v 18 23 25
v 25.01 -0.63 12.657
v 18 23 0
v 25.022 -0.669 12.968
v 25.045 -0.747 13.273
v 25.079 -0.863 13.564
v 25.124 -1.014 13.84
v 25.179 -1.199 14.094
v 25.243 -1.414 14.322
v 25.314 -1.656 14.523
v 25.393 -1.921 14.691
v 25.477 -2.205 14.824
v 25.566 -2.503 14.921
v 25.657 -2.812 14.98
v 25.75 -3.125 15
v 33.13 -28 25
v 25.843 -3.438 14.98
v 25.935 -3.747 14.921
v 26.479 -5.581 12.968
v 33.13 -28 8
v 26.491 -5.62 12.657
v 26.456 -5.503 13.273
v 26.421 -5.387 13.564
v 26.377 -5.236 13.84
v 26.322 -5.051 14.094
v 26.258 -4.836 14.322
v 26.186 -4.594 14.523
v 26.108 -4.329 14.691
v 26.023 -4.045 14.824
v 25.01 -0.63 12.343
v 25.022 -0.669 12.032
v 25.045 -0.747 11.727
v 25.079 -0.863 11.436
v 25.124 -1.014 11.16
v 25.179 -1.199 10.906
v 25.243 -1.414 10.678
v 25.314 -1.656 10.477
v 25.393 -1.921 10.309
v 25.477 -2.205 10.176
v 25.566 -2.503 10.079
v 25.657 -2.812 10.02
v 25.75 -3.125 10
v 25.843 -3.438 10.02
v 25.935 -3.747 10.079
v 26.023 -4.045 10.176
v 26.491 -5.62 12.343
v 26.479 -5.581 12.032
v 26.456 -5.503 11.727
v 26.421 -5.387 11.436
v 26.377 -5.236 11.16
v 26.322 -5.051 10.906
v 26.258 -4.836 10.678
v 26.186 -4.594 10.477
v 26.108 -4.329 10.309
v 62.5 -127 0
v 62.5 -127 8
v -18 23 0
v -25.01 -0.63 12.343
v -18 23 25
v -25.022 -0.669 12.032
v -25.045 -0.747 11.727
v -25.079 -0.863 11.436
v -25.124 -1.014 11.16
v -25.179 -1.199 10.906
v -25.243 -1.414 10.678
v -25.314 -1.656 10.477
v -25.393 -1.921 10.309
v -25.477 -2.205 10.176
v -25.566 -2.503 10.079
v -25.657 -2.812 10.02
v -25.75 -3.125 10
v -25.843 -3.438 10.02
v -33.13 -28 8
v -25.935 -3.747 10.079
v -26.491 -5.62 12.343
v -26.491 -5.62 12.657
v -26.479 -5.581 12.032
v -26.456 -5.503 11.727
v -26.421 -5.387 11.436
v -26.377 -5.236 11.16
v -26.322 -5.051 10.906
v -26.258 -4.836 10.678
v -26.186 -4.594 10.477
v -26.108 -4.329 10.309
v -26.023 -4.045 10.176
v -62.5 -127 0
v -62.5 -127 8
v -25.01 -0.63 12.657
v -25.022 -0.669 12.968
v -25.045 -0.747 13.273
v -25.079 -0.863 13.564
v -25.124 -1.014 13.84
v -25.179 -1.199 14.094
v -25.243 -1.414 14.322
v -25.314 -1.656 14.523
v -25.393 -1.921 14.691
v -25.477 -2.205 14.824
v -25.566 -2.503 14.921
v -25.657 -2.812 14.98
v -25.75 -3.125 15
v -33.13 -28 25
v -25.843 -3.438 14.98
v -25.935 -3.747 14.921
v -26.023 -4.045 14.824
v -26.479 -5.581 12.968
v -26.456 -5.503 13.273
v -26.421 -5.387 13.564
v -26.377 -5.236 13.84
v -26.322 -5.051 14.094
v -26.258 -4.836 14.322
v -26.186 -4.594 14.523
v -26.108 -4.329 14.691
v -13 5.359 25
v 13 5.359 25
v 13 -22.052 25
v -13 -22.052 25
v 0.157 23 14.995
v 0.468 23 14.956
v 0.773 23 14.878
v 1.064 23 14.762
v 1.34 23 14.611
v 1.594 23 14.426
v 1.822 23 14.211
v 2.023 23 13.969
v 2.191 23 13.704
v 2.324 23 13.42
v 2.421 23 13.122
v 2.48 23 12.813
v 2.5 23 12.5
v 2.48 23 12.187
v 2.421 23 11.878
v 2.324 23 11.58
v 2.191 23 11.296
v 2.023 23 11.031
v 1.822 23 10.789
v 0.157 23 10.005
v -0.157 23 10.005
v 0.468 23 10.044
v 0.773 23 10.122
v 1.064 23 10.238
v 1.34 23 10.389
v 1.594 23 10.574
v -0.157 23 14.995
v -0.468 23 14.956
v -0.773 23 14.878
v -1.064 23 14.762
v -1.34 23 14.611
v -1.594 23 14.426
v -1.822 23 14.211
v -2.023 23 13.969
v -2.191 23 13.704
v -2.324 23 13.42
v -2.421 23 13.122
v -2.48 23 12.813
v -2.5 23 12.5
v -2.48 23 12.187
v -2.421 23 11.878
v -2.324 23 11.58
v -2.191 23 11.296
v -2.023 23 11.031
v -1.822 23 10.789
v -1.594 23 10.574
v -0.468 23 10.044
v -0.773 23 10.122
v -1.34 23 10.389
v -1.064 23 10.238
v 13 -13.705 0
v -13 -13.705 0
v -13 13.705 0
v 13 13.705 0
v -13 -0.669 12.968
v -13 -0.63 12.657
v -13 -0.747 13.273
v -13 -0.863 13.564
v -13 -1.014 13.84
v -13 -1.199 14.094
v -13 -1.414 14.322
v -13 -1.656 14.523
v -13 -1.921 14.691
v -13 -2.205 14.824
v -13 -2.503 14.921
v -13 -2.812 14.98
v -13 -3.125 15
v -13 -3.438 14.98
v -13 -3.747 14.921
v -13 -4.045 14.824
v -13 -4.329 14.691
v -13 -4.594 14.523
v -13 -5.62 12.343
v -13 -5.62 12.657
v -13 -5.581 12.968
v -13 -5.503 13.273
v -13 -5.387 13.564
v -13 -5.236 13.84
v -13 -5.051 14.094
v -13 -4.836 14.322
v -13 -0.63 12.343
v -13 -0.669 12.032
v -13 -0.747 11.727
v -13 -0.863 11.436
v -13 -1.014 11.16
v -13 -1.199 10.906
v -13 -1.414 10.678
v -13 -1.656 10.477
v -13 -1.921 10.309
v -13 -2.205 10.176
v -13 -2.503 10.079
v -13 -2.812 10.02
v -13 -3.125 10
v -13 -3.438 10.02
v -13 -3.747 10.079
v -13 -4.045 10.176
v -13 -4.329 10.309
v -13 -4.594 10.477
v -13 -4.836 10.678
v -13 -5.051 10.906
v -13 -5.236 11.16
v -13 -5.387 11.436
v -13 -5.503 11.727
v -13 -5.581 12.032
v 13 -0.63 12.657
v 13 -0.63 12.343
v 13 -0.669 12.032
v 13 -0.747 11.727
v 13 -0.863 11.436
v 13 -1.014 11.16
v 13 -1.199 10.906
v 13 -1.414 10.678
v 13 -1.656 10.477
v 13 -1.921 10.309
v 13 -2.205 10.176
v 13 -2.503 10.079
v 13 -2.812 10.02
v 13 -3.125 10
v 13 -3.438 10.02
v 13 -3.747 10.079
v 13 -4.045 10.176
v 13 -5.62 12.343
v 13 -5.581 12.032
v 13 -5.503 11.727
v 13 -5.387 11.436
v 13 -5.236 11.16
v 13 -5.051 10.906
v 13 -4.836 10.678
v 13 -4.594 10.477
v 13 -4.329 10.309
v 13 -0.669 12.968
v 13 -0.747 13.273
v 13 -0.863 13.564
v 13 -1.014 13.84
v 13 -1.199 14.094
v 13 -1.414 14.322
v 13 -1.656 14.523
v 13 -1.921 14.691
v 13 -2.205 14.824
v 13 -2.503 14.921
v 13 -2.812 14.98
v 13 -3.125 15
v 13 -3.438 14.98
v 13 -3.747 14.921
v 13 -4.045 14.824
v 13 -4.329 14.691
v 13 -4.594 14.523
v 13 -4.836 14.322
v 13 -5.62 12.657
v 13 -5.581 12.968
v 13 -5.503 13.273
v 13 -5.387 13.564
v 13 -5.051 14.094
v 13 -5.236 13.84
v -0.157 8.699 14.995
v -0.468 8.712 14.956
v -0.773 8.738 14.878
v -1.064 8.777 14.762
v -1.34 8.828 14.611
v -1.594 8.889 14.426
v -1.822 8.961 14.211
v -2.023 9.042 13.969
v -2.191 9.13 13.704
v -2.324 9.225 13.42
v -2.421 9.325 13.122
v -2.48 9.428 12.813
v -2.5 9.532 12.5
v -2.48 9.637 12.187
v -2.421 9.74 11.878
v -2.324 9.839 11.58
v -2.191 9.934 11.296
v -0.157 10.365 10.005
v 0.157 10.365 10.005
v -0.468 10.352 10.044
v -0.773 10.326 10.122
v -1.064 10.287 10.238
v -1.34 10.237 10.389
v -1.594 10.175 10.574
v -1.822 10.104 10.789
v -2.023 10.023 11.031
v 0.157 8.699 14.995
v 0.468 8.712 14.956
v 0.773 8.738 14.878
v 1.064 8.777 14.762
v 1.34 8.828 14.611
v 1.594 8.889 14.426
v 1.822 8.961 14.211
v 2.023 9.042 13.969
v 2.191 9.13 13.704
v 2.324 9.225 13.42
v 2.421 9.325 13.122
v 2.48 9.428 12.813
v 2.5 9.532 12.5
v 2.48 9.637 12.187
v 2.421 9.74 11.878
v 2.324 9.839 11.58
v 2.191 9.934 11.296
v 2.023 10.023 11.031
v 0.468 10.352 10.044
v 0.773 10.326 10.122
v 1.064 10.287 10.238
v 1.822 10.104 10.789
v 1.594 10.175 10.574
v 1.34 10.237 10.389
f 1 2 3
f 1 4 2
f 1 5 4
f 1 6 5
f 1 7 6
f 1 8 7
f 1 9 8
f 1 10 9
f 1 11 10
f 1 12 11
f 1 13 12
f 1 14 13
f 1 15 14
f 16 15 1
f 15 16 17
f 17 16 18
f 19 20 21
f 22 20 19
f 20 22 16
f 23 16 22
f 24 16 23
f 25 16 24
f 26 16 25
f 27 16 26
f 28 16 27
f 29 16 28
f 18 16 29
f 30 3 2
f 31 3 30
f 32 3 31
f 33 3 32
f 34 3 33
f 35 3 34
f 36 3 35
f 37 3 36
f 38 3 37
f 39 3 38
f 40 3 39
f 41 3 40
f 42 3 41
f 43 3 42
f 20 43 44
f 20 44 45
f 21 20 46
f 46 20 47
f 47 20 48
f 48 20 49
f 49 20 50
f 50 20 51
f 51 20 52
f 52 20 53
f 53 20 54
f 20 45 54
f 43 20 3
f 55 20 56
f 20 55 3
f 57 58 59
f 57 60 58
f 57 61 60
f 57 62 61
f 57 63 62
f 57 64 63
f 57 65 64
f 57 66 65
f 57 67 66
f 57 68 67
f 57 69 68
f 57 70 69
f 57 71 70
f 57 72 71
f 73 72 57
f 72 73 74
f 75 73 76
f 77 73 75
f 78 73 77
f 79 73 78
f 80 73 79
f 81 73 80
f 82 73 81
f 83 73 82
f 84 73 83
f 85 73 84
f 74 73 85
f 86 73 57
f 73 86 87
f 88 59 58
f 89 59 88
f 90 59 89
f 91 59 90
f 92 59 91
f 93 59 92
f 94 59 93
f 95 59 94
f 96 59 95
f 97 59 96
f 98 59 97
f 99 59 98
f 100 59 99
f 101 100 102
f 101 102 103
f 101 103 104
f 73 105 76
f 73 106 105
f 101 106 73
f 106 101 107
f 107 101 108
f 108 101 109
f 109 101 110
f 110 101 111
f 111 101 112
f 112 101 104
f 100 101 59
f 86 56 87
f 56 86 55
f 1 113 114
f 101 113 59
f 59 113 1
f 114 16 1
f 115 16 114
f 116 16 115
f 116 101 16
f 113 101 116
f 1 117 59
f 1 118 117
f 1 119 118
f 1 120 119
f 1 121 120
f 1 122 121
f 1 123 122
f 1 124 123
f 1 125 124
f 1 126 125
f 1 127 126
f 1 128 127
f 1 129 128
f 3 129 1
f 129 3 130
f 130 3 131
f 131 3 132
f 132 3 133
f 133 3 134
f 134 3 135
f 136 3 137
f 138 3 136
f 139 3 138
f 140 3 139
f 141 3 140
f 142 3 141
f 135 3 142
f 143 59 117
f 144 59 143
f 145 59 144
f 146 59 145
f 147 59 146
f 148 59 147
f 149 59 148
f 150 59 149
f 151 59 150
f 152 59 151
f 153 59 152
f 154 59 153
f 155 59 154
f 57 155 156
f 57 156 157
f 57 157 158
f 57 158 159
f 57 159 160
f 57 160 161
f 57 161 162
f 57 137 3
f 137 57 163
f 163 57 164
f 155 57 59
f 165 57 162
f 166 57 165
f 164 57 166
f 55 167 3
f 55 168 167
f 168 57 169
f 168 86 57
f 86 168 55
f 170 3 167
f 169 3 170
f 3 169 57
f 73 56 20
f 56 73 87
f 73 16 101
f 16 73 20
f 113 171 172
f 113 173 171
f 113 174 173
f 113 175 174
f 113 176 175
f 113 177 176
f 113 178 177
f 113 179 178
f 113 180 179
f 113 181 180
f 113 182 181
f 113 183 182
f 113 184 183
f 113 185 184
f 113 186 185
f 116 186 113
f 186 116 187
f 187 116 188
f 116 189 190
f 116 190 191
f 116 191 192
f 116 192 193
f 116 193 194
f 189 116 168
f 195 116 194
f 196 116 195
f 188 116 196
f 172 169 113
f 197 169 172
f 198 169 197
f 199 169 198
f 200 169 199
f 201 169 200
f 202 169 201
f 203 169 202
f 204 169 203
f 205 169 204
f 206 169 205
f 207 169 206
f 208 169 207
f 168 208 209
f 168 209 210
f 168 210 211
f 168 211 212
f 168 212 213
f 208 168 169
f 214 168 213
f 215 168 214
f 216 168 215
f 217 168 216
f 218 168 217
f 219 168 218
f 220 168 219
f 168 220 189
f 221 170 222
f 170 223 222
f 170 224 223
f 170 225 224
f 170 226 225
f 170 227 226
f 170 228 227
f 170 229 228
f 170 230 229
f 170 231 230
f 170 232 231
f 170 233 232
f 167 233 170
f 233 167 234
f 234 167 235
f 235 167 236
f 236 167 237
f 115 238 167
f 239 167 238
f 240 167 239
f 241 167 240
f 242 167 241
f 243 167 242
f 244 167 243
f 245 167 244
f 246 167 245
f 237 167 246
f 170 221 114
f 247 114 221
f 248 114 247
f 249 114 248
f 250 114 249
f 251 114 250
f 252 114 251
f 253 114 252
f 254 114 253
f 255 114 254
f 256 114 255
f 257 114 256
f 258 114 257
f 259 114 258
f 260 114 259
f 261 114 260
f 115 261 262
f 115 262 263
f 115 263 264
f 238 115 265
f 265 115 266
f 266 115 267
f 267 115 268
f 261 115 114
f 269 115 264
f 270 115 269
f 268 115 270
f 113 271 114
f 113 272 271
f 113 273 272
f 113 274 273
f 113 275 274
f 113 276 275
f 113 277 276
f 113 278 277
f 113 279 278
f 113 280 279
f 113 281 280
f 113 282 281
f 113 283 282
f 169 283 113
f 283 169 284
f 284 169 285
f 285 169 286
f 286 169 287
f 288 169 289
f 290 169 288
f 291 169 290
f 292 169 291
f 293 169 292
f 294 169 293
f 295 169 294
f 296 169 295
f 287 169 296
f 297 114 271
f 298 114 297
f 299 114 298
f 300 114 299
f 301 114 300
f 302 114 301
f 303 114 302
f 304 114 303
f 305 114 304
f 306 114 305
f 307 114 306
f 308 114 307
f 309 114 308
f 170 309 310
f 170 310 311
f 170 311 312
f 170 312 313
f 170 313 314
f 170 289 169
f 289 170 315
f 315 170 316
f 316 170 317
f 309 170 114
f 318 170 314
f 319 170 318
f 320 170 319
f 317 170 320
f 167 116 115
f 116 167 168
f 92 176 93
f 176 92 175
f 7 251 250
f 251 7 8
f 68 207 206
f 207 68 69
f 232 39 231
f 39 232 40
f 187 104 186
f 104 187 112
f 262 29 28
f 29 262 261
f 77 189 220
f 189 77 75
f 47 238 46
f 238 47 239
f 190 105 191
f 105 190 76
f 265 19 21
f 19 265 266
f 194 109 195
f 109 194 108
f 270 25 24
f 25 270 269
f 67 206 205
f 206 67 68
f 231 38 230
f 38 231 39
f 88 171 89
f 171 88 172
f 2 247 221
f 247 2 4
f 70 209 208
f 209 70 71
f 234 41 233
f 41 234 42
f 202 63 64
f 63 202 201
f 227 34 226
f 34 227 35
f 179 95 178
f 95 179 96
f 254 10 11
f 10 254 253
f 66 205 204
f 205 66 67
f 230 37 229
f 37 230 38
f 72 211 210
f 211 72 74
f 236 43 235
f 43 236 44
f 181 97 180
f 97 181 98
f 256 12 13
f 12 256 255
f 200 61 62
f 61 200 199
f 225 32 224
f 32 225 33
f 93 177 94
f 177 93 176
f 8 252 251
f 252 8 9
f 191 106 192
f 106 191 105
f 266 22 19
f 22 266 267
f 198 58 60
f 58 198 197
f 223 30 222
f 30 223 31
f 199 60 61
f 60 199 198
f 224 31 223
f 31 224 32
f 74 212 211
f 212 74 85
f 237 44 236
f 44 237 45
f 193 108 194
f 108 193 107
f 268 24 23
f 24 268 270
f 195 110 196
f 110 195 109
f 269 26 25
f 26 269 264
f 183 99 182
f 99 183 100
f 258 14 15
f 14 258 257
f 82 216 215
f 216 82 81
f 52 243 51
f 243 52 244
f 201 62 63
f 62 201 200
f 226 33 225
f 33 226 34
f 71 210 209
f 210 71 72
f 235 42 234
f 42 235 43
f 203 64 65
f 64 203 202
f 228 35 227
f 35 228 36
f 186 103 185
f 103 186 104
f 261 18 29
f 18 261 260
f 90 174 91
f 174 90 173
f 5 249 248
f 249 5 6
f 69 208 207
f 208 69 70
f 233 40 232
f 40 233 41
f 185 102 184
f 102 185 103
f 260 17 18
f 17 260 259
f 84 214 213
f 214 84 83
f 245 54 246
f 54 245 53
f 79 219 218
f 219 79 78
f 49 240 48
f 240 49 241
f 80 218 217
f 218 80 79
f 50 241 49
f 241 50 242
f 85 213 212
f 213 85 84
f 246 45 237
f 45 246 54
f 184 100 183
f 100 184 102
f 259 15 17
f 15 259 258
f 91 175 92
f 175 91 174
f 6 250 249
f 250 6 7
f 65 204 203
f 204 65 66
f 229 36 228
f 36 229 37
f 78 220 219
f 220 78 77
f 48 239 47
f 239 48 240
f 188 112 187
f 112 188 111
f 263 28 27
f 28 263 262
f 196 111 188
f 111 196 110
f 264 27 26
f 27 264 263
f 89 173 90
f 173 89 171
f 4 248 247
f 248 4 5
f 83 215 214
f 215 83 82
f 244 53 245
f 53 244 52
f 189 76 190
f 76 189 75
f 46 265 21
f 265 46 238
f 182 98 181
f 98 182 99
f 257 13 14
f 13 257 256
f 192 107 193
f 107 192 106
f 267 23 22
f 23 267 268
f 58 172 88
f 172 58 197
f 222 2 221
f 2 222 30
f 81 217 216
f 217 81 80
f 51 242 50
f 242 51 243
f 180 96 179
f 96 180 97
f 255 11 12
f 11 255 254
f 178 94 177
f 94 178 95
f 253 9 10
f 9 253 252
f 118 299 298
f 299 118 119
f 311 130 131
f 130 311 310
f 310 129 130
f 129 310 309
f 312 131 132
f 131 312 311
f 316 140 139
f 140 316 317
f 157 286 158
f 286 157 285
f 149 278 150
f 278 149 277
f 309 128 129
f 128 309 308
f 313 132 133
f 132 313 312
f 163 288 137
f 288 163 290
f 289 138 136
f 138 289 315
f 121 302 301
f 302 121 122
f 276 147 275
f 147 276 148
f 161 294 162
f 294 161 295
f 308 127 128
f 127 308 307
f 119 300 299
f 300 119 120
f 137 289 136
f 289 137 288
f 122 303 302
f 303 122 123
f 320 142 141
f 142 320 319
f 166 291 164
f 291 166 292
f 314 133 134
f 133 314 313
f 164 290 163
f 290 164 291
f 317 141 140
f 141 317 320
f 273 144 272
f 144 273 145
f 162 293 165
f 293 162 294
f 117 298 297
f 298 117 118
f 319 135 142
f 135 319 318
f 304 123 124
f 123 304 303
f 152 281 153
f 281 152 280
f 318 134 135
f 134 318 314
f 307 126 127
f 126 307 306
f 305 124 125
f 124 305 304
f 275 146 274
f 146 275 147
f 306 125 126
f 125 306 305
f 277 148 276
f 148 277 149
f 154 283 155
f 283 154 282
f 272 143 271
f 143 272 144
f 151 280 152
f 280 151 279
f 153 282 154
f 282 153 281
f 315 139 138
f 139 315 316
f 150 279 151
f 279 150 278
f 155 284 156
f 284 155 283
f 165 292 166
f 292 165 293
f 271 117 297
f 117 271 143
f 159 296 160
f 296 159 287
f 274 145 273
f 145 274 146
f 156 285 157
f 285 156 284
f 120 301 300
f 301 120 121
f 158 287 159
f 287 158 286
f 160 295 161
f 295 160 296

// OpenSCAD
// file: variables.scad
// Slide imager variables

//Design and code by Simon Harris, BGS
// simhar@bgs.ac.uk | www.SHphoto.co.uk

//the centre height of the optical system
centerheight=97.5;
// the rail size, allowing a slight positive tolerance (25.4mm becomes 26mm)
rail=26;
//rear filter glass diameter and thickness - remove from holder wearing eye protection
filterdia=63;
filterthick=3;
//diffuser plate dimensions
diffuserdia=60;
diffuserthick=3;
//pivot arm length for filter
pivot=50;
//front filter dimensions - leave in holder
camerafilterdia=57;
camerafilterthread=55;
camerafiltermass=28;
//counterweights
counterweightlength=38.5;
counterweightwidth=13.5;
counterweightmass=12.75 * 3;
//servo dimensions, allowing a slight positive tolerance (0.5mm?) and relative positions of pivot point with wire at bottom, as well as max dimension across ears
servox=12;
servoy=23;
servoxpivot=6;
servoypivot=8;
servoears=32;
// main file
//This part supports the imaging rail at an angle a few degrees above horizontal 

//Design and code by Simon Harris, BGS
// simhar@bgs.ac.uk | www.SHphoto.co.uk

//include global variables
include<variables.scad>;
//overall height of the extruded part
extrude=25;
//thickness of the main support web
webthick=8;
//width at the base
bw=125;
//height - angles will be calculated automatically
h=150;
//length of rail downstream from the prop
lrail=360;
//top width of prop
tw=rail+10;

//calculate rail tilt
tilt=asin((h-(rail*1.0)-10)/lrail);
difference(){
//trapezoid stand
translate([-bw/2,-(h-(rail/2)-10),0])
linear_extrude(height = extrude)
polygon(points=[[(bw/2)-(tw/2),h],[(bw/2)+(tw/2),h],[bw,0],[0,0]]);
//remove thickness
translate([-(bw+10)/2,-h-15-(rail/2)-10,webthick])
cube([bw+10,h+10,extrude]);
//rail
rotate([tilt,0,0])
translate([-(rail)/2,-(rail)/2,-10])
cube([rail,rail,extrude+20]);
//screws to hold to rail - tap M6
translate([0,-extrude/8,extrude/2])
rotate([0,90,0])
cylinder(h=150, r1=2.5, r2=2.5, $fn=50, center=true);
translate([0,-extrude/8,extrude/2])
rotate([-90,0,0])
cylinder(h=150, r1=2.5, r2=2.5, $fn=50, center=false);   
 
}



//fake rail for checking - comment out before export
//rotate([tilt,0,0])
//translate([-(rail)/2,-(rail)/2,0])
//cube([rail,rail,lrail]);
